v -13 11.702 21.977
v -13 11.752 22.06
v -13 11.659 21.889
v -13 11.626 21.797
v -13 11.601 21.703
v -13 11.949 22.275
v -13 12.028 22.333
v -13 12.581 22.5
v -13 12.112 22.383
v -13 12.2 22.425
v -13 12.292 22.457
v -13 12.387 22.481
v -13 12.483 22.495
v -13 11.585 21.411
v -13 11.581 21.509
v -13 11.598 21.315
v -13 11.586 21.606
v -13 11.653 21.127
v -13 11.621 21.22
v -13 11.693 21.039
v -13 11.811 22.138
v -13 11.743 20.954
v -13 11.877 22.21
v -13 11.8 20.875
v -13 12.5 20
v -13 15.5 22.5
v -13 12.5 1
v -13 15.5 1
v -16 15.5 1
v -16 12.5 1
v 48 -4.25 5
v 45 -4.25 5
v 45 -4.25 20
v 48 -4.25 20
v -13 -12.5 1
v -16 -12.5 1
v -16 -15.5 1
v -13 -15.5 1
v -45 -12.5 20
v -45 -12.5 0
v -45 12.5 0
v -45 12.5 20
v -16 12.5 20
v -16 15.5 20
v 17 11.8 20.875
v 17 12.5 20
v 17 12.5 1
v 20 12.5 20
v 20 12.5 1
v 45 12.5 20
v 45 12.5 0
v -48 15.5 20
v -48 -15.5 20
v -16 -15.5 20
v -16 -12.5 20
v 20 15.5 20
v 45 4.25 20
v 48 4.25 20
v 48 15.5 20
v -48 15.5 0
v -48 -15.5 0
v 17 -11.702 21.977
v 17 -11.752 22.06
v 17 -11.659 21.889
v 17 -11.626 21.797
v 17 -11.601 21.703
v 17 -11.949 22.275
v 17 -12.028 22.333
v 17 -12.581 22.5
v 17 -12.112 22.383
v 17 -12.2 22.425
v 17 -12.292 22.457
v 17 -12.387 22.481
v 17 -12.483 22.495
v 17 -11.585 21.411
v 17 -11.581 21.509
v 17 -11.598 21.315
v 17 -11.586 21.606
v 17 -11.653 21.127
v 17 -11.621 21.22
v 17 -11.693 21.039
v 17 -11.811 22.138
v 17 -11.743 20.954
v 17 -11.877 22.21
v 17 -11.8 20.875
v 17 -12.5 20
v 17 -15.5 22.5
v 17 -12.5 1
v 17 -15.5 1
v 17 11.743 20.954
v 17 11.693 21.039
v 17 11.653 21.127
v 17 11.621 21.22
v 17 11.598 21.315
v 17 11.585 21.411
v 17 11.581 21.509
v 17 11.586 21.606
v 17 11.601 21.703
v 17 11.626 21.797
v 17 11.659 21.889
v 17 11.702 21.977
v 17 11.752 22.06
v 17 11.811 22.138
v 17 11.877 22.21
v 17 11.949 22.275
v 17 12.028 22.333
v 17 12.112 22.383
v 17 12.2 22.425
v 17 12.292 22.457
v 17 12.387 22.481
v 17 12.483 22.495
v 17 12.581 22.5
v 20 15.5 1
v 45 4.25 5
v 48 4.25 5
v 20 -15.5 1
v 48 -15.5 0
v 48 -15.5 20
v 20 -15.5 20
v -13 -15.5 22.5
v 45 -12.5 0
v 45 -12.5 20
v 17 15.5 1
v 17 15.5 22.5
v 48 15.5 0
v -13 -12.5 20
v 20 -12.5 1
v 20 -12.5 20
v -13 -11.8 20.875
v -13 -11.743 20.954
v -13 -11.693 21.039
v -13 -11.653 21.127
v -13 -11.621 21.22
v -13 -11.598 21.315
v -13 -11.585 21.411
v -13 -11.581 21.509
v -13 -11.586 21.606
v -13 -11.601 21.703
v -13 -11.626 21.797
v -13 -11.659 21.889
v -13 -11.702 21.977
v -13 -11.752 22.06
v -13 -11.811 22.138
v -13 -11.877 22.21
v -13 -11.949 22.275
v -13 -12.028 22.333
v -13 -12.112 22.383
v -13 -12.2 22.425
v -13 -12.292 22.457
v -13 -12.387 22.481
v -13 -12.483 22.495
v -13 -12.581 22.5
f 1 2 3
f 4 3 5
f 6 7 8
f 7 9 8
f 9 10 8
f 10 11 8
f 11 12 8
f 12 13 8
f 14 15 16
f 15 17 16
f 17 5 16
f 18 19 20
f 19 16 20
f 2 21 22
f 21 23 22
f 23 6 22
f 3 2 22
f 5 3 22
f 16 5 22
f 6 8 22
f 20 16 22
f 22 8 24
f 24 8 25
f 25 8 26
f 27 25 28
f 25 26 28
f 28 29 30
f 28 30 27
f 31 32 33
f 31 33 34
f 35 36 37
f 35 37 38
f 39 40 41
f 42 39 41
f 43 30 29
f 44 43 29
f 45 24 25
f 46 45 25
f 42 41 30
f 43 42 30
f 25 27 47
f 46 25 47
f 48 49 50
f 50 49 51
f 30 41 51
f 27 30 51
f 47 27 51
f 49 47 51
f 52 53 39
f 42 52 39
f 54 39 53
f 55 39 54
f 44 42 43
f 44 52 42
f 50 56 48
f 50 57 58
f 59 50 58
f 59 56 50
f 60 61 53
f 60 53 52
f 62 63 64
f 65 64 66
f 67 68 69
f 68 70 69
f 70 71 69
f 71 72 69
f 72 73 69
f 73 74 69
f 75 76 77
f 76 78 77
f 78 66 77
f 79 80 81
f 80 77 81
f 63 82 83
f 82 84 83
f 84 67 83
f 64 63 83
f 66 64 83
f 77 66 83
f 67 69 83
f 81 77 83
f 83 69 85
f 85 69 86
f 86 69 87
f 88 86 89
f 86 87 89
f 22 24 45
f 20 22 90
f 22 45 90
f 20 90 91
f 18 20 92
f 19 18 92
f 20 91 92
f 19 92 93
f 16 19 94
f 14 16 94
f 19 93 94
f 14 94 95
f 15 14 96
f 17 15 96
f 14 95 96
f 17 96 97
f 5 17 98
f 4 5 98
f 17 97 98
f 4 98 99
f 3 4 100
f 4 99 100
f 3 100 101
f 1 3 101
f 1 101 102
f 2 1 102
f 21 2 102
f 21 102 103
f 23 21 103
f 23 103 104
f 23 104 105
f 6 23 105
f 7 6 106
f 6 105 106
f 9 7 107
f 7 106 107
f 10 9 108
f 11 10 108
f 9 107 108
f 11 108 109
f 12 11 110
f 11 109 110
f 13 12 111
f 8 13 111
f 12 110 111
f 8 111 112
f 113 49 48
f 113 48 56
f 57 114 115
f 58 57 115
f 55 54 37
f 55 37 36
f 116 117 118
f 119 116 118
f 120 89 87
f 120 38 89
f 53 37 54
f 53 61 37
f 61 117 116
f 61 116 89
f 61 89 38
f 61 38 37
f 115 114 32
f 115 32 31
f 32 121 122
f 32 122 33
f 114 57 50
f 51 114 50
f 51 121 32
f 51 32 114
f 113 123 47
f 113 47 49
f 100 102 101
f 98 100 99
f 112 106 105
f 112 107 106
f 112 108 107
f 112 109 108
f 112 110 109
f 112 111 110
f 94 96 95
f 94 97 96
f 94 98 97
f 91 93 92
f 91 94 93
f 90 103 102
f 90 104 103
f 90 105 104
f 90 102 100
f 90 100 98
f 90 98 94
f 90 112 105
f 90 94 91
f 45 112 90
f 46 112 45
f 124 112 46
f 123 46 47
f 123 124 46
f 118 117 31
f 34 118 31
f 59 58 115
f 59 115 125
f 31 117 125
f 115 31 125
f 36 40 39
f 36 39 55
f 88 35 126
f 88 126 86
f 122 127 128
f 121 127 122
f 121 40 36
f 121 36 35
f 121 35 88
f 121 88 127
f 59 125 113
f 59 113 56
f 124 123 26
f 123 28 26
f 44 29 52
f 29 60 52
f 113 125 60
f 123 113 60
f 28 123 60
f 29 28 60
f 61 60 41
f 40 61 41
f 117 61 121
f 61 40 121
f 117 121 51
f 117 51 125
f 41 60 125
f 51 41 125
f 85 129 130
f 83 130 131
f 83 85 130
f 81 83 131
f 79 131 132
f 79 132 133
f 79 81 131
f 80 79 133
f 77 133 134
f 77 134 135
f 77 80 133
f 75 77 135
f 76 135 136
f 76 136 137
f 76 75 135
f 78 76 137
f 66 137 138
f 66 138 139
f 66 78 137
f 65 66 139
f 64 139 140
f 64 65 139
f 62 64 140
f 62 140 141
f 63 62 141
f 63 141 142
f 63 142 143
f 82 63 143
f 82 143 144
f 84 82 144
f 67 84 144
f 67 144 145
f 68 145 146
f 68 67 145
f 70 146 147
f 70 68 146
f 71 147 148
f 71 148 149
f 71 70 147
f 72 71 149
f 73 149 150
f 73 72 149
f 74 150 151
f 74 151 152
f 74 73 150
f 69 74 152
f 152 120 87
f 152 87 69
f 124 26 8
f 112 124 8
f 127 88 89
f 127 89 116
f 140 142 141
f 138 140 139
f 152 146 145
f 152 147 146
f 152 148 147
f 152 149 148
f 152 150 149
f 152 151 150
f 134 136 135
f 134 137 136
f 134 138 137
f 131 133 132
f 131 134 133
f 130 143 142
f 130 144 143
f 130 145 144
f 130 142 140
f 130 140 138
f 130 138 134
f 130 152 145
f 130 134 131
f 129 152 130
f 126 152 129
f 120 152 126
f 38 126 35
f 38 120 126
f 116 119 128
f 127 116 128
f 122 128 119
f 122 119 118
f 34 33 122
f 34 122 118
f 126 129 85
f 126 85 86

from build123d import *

# Parameters (mm, degrees)
SKETCH_1_W             = 96
SKETCH_1_H             = 31
SKETCH_1_W_2           = 90
SKETCH_1_H_2           = 25
EXTRUDE_1_DEPTH        = 20
SKETCH_2_W             = 42.974010058
SKETCH_2_H             = 8.5
CUT_EXTRUDE_1_DEPTH    = 15
SKETCH_3_W             = 3
SKETCH_3_H             = 65.210399997
CUT_EXTRUDE_1_2_DEPTH  = 19
EXTRUDE_1_2_DEPTH      = 30
FILLET_1_R             = 1
FILLET_1_OF_MIRROR_2_R = 1


with BuildPart() as part:
    # 草图1 → Extrude 1 (new body)
    with BuildSketch(Plane.XY):
        Rectangle(SKETCH_1_W, SKETCH_1_H)
        Rectangle(SKETCH_1_W_2, SKETCH_1_H_2, mode=Mode.SUBTRACT)
    extrude(amount=EXTRUDE_1_DEPTH)

    # 草图2 → Cut-Extrude 1 (cut)
    with BuildSketch(Plane.XY.offset(20)):
        with Locations((45, 0)):
            Rectangle(SKETCH_2_W, SKETCH_2_H)
    extrude(amount=-CUT_EXTRUDE_1_DEPTH, mode=Mode.SUBTRACT)

    # 草图3 → Cut-Extrude 1 2 (cut)
    with BuildSketch(Plane.XY.offset(20)):
        with Locations((-14.5, 3.518261773)):
            Rectangle(SKETCH_3_W, SKETCH_3_H)
        with Locations((18.5, 3.518261773)):
            Rectangle(SKETCH_3_W, SKETCH_3_H)
    extrude(amount=-CUT_EXTRUDE_1_2_DEPTH, mode=Mode.SUBTRACT)

    # 草图4 → Extrude 1 2 (add)
    with BuildSketch(Plane.ZY.offset(13)):
        Polygon((20, 15.5), (22.5, 15.5), (22.5, 10.5), (20, 12.5), align=None)
    extrude_1_2 = extrude(amount=-EXTRUDE_1_2_DEPTH)

    # 圆角1
    fillet_1_edges = [part.edges().sort_by_distance(p)[0] for p in [
        (2, 10.5, 22.5),
    ]]
    fillet(fillet_1_edges, radius=FILLET_1_R)

    # 镜向2: Extrude 1 2 across plane
    add(extrude_1_2.mirror(Plane.ZX))

    # 圆角1 of 镜向2
    fillet_1_of_mirror_2_edges = [part.edges().sort_by_distance(p)[0] for p in [
        (2, -10.5, 22.5),
    ]]
    fillet(fillet_1_of_mirror_2_edges, radius=FILLET_1_OF_MIRROR_2_R)


solid = part.part
